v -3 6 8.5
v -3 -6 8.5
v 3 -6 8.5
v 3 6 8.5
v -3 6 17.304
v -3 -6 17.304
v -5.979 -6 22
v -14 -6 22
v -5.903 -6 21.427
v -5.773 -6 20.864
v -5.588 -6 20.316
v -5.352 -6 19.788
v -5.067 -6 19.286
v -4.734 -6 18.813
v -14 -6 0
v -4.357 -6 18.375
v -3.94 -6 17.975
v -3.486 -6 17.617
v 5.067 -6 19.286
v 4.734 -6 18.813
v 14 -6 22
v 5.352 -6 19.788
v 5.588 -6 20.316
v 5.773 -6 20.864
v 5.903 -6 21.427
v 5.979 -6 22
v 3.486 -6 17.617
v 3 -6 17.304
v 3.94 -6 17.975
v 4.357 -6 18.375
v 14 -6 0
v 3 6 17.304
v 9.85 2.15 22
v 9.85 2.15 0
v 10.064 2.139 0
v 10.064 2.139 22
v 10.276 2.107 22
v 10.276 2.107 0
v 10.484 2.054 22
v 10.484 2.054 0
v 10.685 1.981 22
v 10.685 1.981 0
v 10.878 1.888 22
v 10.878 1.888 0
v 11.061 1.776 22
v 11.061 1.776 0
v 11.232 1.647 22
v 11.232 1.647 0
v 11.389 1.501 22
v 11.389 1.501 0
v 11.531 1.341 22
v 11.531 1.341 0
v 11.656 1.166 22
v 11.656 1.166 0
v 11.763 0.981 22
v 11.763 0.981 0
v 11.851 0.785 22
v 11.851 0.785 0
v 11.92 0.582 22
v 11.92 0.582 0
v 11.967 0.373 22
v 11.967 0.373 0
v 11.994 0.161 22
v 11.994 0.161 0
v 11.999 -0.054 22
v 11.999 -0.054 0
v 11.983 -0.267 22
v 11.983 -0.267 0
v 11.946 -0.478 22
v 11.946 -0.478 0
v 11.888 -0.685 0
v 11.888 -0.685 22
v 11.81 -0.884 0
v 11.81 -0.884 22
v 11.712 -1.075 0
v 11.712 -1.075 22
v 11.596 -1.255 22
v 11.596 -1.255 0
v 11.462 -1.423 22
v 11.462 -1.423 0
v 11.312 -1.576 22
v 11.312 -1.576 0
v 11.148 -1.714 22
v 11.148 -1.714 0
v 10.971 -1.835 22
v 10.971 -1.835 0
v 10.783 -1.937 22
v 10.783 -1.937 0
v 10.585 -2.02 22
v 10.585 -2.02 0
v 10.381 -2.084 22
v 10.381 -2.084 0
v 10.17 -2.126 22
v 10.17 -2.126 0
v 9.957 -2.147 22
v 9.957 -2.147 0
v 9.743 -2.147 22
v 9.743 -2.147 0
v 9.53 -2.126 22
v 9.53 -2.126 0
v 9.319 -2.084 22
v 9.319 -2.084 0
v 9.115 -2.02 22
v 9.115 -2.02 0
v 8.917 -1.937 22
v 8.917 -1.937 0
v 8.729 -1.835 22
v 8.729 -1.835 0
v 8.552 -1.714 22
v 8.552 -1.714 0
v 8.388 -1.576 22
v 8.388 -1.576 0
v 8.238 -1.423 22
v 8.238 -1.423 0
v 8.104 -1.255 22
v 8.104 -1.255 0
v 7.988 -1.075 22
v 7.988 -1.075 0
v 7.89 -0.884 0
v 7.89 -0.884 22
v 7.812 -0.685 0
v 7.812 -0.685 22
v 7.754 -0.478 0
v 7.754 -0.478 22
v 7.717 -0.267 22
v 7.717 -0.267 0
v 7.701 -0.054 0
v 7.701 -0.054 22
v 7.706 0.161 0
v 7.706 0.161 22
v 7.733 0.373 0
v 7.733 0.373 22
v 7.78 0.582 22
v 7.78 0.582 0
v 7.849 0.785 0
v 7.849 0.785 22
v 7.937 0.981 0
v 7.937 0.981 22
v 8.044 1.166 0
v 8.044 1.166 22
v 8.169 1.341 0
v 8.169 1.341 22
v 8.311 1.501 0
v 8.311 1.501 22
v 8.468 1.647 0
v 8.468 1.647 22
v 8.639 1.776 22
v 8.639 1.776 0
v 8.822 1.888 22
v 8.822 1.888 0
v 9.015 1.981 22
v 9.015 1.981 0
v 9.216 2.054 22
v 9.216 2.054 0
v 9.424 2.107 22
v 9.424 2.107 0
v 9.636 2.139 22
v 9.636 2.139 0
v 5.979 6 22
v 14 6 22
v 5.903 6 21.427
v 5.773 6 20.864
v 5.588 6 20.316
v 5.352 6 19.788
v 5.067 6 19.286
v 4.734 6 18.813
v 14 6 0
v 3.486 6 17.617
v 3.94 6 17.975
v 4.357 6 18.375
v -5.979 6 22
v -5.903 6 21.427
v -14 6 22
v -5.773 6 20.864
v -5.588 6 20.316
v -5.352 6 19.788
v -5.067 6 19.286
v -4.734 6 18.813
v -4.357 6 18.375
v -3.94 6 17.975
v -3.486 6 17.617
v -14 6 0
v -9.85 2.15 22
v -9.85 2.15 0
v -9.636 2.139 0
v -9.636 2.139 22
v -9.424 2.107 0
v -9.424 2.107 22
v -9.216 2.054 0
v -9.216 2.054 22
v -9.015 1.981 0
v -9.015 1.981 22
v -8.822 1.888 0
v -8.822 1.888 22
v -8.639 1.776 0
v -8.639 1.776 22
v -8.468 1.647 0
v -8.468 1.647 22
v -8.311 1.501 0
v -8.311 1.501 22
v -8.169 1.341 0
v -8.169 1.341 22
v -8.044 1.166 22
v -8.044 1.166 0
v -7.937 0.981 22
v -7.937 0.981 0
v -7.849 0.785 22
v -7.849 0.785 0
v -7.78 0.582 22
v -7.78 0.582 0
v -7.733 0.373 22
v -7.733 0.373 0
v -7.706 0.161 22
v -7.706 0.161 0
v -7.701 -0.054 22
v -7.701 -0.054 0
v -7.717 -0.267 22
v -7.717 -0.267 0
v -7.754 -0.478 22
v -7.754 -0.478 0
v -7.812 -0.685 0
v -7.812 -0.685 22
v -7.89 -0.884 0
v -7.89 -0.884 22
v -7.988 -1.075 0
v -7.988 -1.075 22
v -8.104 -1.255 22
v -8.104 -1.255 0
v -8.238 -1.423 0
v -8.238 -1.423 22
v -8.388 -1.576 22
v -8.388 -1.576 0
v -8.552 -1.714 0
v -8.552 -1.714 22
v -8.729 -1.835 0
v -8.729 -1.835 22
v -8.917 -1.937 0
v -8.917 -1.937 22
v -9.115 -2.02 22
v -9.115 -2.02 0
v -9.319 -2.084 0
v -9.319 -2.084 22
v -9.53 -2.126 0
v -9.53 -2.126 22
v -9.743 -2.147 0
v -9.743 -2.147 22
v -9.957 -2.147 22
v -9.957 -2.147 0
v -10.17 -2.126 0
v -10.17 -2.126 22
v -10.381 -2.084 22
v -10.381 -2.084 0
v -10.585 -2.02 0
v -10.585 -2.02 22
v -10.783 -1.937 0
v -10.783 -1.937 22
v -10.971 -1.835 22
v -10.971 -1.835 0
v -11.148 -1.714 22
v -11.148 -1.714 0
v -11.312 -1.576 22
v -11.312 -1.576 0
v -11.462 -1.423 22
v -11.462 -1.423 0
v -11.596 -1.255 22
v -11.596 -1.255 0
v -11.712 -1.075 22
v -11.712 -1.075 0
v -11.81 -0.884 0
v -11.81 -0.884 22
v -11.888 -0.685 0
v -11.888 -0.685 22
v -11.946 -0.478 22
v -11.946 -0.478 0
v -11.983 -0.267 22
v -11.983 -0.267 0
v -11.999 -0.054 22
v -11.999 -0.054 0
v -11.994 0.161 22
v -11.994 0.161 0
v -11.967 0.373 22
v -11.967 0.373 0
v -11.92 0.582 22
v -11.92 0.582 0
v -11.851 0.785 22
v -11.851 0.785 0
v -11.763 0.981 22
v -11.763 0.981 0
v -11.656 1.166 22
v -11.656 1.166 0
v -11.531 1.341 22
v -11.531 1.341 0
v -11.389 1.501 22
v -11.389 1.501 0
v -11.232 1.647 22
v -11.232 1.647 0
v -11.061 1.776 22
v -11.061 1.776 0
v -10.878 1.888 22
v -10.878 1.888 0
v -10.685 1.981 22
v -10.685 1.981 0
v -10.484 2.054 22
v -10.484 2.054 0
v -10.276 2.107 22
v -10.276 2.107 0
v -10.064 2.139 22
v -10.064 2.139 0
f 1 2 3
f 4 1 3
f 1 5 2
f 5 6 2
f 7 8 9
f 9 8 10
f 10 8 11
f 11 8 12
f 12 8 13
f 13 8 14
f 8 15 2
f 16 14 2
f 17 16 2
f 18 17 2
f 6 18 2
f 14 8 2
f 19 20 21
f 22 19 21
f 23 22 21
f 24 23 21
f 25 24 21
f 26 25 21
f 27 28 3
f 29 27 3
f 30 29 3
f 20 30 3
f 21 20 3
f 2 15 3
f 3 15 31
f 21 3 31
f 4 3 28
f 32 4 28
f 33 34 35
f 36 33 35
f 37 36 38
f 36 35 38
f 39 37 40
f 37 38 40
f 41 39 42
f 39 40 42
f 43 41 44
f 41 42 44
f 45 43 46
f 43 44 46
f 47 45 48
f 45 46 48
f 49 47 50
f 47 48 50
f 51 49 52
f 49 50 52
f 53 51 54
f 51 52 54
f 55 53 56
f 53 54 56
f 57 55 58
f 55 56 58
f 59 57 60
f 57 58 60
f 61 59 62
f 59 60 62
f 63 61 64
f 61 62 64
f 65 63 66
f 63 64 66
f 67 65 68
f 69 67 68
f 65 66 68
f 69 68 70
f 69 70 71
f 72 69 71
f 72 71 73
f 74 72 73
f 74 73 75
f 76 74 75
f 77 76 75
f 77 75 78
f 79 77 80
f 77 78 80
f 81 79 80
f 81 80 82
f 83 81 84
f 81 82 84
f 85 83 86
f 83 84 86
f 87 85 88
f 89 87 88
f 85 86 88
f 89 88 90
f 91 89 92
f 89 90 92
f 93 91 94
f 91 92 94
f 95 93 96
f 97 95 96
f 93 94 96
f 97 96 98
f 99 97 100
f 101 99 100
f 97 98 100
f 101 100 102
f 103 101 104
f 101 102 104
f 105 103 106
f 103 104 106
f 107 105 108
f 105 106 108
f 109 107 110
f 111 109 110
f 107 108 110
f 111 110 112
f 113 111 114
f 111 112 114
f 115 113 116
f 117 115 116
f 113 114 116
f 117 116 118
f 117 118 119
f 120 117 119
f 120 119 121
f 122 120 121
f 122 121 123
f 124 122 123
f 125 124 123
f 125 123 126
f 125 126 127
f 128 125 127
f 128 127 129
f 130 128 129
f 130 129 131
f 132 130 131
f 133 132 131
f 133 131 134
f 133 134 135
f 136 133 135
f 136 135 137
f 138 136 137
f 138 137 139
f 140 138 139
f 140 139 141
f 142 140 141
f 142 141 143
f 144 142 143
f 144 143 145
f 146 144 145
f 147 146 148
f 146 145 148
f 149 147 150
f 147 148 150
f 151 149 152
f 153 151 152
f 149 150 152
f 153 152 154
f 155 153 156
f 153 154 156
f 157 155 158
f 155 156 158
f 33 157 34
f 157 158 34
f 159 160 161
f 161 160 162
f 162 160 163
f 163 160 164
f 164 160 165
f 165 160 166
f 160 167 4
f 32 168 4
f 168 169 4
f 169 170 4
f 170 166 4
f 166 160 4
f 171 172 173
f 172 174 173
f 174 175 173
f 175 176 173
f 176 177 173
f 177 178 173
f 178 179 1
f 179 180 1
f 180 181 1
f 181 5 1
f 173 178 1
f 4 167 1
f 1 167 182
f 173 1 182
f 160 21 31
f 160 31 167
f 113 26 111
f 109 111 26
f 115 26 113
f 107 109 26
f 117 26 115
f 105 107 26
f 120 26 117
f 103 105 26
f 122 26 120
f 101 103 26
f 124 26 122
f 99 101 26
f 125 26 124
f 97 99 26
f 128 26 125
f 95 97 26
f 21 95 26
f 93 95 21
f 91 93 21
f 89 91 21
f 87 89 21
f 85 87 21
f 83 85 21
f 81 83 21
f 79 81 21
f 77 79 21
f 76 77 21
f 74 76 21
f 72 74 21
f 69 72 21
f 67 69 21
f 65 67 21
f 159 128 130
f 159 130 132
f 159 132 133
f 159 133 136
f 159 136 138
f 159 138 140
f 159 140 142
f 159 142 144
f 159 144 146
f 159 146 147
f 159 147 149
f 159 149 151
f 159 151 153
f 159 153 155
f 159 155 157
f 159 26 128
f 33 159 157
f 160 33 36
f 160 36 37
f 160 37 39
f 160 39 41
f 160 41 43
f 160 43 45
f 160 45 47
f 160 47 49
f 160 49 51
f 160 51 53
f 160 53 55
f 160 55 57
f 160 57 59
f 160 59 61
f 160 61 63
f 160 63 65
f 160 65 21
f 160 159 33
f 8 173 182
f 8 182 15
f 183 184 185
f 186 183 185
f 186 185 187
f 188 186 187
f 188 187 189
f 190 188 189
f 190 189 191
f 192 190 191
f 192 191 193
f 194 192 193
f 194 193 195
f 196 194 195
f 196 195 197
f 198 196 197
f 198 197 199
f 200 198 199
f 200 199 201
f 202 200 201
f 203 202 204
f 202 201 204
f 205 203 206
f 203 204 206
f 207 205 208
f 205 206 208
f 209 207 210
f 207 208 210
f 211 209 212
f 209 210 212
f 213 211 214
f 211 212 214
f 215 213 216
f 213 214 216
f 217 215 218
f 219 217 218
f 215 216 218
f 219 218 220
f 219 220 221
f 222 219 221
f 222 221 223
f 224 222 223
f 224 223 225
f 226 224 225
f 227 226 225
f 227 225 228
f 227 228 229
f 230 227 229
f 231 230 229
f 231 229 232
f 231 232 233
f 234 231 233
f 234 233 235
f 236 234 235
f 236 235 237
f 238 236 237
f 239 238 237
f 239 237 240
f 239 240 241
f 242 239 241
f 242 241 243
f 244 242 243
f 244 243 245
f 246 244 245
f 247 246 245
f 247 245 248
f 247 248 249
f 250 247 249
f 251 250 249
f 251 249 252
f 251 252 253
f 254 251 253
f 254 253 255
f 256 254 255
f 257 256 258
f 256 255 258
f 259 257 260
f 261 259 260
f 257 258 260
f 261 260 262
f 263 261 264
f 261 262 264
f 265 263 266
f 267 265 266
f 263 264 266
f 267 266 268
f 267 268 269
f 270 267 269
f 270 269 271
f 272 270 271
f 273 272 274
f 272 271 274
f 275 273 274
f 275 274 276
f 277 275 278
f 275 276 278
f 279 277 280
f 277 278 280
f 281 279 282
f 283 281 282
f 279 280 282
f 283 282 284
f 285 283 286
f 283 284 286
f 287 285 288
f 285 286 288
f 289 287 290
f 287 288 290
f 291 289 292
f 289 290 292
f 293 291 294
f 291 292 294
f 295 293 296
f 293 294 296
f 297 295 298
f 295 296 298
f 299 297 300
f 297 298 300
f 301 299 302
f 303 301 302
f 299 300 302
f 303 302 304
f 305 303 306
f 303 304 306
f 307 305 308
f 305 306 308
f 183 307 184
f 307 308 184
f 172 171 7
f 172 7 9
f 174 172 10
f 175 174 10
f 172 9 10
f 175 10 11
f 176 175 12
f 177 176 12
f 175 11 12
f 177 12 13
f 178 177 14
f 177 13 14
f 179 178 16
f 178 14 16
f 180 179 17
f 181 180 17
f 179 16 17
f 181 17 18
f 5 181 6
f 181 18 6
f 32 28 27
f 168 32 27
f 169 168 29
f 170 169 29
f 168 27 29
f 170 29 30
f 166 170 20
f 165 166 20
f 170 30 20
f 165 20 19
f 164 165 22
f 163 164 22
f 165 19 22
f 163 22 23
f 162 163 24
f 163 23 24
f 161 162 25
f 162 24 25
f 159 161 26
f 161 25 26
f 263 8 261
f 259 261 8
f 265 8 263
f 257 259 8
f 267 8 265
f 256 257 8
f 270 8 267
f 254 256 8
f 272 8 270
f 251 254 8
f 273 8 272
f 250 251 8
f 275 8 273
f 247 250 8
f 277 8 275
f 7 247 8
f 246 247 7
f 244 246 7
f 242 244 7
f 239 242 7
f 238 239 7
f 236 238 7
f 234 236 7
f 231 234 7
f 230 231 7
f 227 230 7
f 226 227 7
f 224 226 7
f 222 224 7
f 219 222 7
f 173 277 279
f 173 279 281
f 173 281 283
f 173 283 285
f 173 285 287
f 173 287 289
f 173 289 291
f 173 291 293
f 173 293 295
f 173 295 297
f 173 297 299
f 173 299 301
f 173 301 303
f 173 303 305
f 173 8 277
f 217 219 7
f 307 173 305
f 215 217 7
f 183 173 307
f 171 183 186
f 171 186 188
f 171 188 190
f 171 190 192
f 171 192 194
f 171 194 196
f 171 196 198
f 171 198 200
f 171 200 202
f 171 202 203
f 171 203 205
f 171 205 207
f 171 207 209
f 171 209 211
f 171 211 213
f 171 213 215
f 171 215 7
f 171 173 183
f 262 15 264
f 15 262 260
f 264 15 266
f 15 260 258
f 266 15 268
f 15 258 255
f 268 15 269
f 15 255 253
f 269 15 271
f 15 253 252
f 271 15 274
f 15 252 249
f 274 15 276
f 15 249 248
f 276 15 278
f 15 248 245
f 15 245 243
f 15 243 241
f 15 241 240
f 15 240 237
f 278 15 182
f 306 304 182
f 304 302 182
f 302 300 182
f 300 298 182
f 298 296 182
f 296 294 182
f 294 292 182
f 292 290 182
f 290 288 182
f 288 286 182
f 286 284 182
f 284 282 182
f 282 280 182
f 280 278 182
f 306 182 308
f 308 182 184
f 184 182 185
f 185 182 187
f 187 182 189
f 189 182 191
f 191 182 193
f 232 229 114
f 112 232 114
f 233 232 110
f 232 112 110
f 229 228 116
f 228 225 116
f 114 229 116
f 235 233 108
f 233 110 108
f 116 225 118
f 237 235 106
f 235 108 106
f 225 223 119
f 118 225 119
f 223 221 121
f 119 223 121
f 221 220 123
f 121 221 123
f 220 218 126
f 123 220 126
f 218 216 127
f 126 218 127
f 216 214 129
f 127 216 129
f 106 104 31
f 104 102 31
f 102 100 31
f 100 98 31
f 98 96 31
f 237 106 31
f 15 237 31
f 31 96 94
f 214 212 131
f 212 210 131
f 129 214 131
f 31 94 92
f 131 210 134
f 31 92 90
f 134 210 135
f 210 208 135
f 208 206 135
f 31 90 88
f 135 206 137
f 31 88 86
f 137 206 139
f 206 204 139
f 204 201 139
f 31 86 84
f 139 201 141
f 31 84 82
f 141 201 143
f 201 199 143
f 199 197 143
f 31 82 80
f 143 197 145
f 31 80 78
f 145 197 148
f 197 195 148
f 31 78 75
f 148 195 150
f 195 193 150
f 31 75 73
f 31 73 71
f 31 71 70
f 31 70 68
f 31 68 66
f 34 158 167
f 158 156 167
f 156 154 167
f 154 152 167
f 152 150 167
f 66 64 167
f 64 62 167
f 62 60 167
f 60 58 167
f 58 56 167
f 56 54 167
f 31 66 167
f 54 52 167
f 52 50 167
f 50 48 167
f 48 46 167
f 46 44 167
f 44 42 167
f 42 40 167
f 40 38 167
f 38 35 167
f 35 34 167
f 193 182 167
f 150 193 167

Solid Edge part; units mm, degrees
sketch "Sketch1" plane through (0, 0, 0) normal (0, 0, 1) x (1, 0, 0)
  line L0 (-14, -6) -> (14, -6)
  line L1 (14, -6) -> (14, 6)
  line L2 (14, 6) -> (-14, 6)
  line L3 (-14, 6) -> (-14, -6)
  dimension "D1" = 28
  dimension "D2" = 12
extrude "Ajout_matière_1" add sketch "Sketch1" along normal blind 22
sketch "Sketch2" plane through (0, -6, 10) normal (0, -1, 0) x (1, 0, 0)
  circle A0 centre (0, 12.5) radius 6
  dimension "D1" = 12
  dimension "D2" = 22.5
extrude "Cutout1" cut sketch "Sketch2" against normal through all
sketch "Sketch3" plane through (0, -6, 10) normal (0, -1, 0) x (1, 0, 0)
  line L0 (-3, -1.5) -> (3, -1.5)
  line L1 (3, -1.5) -> (3, 12.5)
  line L2 (3, 12.5) -> (-3, 12.5)
  line L3 (-3, 12.5) -> (-3, -1.5)
  dimension "D1" = 14
  dimension "D2" = 6
  dimension "D3" = 8.5
  dimension "D4" = 8
extrude "Cutout2" cut sketch "Sketch3" against normal through all
hole "Perçage_1" at (9.85, 0, 0) direction (0, 0, 1) diameter 4.3 end through all
hole "Hole1" at (-9.85, 0, 0) direction (0, 0, 1) diameter 4.3 end through all
properties material "Plastique ABS, performance moyenne"
